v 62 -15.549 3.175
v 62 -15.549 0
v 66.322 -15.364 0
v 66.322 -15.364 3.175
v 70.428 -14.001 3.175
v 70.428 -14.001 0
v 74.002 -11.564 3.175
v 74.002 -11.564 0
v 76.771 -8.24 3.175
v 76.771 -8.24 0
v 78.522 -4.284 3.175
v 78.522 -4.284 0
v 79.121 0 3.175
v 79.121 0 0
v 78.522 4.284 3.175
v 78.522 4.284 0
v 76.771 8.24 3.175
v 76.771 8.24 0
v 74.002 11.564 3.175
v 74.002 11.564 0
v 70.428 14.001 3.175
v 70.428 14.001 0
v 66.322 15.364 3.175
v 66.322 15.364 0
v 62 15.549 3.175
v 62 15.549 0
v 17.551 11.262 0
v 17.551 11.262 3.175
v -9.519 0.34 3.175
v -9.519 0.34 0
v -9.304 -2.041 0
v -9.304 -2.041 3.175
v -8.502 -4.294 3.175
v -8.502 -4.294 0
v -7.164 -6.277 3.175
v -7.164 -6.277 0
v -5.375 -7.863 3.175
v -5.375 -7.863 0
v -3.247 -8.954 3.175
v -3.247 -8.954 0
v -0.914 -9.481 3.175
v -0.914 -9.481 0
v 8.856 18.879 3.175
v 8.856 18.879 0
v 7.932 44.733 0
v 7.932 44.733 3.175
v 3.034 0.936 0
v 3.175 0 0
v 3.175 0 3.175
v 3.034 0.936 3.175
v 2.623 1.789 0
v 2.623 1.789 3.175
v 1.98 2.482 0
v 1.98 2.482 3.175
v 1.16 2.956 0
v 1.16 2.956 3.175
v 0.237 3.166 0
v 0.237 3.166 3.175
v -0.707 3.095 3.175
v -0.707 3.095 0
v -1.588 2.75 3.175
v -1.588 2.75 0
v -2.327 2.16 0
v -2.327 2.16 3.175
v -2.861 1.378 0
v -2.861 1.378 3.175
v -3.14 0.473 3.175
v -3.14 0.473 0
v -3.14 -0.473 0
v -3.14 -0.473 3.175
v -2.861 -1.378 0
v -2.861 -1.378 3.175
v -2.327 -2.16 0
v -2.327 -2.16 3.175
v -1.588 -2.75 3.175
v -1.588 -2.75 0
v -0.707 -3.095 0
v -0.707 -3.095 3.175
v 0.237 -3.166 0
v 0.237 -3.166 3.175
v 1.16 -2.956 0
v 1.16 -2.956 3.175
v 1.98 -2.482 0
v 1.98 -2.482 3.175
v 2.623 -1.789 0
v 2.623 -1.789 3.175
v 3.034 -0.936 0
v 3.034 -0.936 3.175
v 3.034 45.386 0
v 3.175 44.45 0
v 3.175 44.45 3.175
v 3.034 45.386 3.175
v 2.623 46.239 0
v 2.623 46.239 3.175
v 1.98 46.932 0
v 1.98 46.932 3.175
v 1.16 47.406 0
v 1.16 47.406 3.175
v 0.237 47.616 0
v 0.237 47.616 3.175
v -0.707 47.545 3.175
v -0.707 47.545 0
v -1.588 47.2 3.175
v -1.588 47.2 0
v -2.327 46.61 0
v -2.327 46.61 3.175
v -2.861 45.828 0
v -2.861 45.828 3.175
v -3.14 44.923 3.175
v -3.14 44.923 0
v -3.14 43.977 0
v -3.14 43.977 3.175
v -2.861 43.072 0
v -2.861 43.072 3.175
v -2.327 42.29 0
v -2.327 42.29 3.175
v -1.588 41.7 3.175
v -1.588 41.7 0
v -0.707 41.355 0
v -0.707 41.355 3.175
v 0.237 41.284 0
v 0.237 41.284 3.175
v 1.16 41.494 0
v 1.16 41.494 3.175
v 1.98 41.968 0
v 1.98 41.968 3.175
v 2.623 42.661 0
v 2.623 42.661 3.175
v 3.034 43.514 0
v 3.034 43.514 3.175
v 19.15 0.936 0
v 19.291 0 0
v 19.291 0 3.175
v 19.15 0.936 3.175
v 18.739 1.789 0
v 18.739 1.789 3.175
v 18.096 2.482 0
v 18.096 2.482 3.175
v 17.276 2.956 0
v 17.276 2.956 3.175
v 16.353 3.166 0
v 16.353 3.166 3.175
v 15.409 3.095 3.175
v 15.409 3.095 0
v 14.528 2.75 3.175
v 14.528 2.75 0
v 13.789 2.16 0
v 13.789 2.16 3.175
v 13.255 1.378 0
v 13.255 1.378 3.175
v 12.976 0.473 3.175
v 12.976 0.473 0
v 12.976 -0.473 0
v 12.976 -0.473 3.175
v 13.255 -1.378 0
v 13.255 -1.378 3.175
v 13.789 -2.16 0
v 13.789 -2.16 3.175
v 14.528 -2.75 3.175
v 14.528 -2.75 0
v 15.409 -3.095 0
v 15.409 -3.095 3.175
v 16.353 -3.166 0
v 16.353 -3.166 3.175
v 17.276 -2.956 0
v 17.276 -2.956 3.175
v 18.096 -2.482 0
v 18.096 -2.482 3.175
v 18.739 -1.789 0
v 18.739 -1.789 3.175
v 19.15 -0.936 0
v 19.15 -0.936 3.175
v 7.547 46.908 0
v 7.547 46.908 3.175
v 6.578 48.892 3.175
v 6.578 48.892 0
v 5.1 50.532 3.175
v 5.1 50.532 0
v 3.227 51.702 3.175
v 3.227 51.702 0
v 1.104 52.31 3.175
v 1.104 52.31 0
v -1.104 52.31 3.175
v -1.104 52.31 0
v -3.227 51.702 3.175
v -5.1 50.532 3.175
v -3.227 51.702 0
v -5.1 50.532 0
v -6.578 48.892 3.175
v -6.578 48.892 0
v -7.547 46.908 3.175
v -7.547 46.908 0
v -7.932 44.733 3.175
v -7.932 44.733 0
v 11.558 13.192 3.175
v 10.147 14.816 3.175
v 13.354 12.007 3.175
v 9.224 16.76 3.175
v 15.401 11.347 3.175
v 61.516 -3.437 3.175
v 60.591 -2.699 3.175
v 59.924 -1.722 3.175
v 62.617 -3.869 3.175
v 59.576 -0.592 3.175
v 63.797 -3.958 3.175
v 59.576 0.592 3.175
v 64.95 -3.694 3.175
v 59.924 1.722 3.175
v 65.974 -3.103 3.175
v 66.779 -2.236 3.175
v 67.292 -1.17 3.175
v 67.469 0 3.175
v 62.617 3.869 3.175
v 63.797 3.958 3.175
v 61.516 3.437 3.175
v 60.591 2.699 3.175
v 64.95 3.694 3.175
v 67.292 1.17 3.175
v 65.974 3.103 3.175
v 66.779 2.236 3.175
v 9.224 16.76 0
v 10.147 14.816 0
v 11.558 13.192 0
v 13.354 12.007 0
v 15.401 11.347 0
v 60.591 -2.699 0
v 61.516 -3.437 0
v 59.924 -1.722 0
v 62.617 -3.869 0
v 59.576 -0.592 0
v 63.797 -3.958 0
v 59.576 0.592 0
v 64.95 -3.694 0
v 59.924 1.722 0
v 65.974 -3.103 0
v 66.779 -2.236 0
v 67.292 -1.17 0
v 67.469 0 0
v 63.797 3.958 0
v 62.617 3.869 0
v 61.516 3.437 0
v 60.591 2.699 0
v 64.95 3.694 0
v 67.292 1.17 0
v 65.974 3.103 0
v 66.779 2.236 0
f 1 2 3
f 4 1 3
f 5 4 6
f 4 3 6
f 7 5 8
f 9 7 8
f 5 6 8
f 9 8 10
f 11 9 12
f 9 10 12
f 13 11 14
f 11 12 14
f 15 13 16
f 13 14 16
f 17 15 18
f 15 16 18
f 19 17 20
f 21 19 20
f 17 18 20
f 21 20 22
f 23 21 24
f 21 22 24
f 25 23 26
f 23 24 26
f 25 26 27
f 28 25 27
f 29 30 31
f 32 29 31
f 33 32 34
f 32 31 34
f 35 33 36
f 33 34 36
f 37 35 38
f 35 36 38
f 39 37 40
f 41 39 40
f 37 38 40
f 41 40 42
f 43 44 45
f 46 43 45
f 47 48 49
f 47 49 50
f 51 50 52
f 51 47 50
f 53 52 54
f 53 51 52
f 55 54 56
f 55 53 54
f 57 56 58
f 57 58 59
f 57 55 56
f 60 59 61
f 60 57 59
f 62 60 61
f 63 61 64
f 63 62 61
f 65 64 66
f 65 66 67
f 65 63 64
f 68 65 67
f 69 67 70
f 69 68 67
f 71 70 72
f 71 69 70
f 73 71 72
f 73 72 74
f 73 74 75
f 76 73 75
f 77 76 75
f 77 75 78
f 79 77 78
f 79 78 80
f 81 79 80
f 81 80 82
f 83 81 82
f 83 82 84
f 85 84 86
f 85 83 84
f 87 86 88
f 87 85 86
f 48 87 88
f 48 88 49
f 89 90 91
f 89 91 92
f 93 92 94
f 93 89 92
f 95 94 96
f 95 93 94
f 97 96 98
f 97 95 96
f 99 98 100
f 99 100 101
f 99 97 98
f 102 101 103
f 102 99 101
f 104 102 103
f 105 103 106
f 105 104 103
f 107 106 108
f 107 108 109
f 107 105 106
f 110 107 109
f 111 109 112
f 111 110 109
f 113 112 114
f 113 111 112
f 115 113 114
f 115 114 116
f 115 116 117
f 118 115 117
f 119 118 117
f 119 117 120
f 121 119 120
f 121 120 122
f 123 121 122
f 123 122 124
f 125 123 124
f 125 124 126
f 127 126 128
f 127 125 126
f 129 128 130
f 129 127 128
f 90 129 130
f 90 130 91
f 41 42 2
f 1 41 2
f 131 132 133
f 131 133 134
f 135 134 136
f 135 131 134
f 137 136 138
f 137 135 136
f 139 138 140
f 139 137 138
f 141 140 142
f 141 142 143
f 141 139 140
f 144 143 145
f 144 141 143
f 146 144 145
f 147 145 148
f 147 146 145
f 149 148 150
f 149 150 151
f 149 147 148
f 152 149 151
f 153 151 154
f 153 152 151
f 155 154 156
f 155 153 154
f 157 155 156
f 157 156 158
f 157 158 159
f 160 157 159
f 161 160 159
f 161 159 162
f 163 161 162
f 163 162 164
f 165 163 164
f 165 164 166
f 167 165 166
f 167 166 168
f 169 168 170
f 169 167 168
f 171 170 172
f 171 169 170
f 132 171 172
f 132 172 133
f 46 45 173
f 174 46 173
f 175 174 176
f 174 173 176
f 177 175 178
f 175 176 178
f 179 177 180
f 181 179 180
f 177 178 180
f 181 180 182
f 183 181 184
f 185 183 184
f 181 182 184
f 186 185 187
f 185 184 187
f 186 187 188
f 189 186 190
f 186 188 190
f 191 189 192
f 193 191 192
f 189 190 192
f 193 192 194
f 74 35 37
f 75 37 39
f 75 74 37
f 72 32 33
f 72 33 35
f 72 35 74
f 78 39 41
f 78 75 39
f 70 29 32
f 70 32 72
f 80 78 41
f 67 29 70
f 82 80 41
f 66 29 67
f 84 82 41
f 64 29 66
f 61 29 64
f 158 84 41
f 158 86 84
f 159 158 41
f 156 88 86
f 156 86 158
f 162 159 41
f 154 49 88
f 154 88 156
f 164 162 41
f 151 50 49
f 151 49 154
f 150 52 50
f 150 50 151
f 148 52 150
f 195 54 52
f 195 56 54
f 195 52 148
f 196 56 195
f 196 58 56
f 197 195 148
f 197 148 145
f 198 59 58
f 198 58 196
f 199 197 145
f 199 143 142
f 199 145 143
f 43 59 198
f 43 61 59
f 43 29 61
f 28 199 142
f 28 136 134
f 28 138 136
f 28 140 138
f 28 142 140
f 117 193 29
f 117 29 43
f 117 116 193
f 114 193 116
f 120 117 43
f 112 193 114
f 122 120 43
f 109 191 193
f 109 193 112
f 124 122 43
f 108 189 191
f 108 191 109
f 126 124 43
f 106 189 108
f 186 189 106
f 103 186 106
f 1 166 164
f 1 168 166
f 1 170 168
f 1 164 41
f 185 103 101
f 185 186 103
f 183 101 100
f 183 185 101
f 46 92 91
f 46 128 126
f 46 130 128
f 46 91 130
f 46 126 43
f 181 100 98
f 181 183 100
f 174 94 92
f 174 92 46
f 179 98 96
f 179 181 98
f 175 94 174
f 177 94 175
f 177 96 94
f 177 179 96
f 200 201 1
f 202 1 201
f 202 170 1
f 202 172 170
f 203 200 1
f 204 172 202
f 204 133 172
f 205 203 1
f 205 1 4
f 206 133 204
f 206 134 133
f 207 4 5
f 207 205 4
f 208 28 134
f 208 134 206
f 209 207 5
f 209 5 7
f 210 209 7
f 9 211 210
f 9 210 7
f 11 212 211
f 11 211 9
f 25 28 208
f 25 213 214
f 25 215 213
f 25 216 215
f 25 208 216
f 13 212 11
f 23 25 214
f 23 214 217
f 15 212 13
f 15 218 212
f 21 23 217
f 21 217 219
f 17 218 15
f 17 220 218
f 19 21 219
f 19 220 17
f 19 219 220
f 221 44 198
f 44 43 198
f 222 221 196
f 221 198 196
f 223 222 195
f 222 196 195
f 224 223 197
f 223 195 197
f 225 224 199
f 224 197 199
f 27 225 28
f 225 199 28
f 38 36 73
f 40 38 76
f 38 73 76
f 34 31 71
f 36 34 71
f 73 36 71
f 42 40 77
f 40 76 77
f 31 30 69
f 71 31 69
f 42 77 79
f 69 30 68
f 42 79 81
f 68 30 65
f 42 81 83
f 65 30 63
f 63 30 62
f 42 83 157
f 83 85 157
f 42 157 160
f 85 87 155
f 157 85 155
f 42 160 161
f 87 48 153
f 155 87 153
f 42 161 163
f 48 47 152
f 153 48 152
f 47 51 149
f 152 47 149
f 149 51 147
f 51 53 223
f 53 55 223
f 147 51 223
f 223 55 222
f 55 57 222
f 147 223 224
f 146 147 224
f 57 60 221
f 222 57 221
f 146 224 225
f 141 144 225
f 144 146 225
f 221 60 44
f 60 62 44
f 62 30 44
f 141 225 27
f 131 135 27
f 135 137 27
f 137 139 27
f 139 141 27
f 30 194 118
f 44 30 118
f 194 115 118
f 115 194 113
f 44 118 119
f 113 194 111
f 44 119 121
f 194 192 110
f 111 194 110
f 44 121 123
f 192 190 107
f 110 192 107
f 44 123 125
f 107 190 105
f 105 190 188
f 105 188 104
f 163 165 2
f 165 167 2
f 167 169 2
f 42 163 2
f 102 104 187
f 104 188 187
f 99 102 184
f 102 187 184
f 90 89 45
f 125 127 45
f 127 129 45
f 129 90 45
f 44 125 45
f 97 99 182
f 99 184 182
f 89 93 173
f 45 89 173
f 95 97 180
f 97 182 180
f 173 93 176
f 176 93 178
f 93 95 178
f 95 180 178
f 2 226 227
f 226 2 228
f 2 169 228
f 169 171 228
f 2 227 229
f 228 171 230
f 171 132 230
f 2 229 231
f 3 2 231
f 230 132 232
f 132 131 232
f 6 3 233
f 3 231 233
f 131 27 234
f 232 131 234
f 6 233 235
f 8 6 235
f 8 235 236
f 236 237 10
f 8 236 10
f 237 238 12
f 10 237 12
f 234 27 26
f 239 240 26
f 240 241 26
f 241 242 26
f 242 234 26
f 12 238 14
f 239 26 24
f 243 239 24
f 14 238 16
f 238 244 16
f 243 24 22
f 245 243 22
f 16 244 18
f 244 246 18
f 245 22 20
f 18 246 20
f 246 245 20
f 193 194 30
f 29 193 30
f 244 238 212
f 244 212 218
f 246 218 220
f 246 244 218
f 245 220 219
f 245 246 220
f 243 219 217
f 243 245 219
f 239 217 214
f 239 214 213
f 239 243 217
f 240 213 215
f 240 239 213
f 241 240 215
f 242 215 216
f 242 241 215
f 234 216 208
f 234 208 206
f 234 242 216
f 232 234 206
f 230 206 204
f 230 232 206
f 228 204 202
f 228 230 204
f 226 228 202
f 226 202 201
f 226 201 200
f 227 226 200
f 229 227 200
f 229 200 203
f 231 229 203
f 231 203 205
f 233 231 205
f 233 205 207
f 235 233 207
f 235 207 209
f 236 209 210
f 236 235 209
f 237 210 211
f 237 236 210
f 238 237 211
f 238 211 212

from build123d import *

# Parameters (mm, degrees)
F0_R     = 3.175
F0_R_2   = 3.96875
F1_DEPTH = 3.175
F2_R     = 7.9375


with BuildPart() as f1:
    # F0 (on Top) → F1 (new body)
    with BuildSketch(Plane.XY):
        with BuildLine():
            ThreePointArc((-7.9324362036, 44.7334821429), (-0.1417636831, 36.5137660501), (7.9375, 44.45))
            ThreePointArc((7.9375, 44.45), (7.9362339499, 44.5917636831), (7.9324362036, 44.7334821429))
            ThreePointArc((7.9324362036, 44.7334821429), (0, 52.3875), (-7.9324362036, 44.7334821429))
        make_face()
        with Locations((0, 44.45)):
            Circle(F0_R, mode=Mode.SUBTRACT)
        with BuildLine():
            ThreePointArc((7.9324362036, 44.7334821429), (7.9362339499, 44.5917636831), (7.9375, 44.45))
            ThreePointArc((7.9375, 44.45), (-0.1417636831, 36.5137660501), (-7.9324362036, 44.7334821429))
            Line((-7.9324362036, 44.7334821429), (-9.5189234444, 0.3401785714))
            ThreePointArc((-9.5189234444, 0.3401785714), (-6.9355783144, 6.5286582423), (-0.9144, 9.481007206))
            Line((-0.9144, 9.481007206), (9.157542126, 10.4524001899))
            Line((9.157542126, 10.4524001899), (7.9324362036, 44.7334821429))
        make_face()
        with BuildLine():
            Line((9.51892344, 0.3401786947), (9.157542126, 10.4524001899))
            Line((9.157542126, 10.4524001899), (-0.9144, 9.481007206))
            ThreePointArc((-0.9144, 9.481007206), (6.2767939568, 7.164320109), (9.51892344, 0.3401786947))
        make_face()
        with BuildLine():
            Line((62.000384, 15.5488518178), (9.157542126, 10.4524001899))
            Line((9.157542126, 10.4524001899), (9.51892344, 0.3401786947))
            ThreePointArc((9.51892344, 0.3401786947), (9.5234807388, 0.1701164813), (9.525, 0))
            ThreePointArc((9.525, 0), (6.4037475356, -7.0510738544), (-0.9144, -9.481007206))
            Line((-0.9144, -9.481007206), (62.000384, -15.5488518178))
            ThreePointArc((62.000384, -15.5488518178), (47.879, 0), (62.000384, 15.5488518178))
        make_face()
        with Locations((16.1159988493, 0)):
            Circle(F0_R, mode=Mode.SUBTRACT)
        with BuildLine():
            ThreePointArc((-0.9144, 9.481007206), (-6.9355783144, 6.5286582423), (-9.5189234444, 0.3401785714))
            ThreePointArc((-9.5189234444, 0.3401785714), (-7.1643200684, -6.2767940031), (-0.9144, -9.481007206))
            ThreePointArc((-0.9144, -9.481007206), (6.4037475356, -7.0510738544), (9.525, 0))
            ThreePointArc((9.525, 0), (9.5234807388, 0.1701164813), (9.51892344, 0.3401786947))
            ThreePointArc((9.51892344, 0.3401786947), (6.2767939568, 7.164320109), (-0.9144, 9.481007206))
        make_face()
        Circle(F0_R, mode=Mode.SUBTRACT)
        with BuildLine():
            ThreePointArc((79.121, 0), (74.0021459584, 11.5637611212), (62.000384, 15.5488518178))
            ThreePointArc((62.000384, 15.5488518178), (47.879, 0), (62.000384, -15.5488518178))
            ThreePointArc((62.000384, -15.5488518178), (74.0021459584, -11.5637611212), (79.121, 0))
        make_face()
        with Locations((63.5, 0)):
            Circle(F0_R_2, mode=Mode.SUBTRACT)
    extrude(amount=F1_DEPTH)

    # F2
    f2_edges = [f1.edges().sort_by_distance(p)[0] for p in [
        (9.157542, 10.4524, 1.5875),
    ]]
    fillet(f2_edges, radius=F2_R)


solid = f1.part
